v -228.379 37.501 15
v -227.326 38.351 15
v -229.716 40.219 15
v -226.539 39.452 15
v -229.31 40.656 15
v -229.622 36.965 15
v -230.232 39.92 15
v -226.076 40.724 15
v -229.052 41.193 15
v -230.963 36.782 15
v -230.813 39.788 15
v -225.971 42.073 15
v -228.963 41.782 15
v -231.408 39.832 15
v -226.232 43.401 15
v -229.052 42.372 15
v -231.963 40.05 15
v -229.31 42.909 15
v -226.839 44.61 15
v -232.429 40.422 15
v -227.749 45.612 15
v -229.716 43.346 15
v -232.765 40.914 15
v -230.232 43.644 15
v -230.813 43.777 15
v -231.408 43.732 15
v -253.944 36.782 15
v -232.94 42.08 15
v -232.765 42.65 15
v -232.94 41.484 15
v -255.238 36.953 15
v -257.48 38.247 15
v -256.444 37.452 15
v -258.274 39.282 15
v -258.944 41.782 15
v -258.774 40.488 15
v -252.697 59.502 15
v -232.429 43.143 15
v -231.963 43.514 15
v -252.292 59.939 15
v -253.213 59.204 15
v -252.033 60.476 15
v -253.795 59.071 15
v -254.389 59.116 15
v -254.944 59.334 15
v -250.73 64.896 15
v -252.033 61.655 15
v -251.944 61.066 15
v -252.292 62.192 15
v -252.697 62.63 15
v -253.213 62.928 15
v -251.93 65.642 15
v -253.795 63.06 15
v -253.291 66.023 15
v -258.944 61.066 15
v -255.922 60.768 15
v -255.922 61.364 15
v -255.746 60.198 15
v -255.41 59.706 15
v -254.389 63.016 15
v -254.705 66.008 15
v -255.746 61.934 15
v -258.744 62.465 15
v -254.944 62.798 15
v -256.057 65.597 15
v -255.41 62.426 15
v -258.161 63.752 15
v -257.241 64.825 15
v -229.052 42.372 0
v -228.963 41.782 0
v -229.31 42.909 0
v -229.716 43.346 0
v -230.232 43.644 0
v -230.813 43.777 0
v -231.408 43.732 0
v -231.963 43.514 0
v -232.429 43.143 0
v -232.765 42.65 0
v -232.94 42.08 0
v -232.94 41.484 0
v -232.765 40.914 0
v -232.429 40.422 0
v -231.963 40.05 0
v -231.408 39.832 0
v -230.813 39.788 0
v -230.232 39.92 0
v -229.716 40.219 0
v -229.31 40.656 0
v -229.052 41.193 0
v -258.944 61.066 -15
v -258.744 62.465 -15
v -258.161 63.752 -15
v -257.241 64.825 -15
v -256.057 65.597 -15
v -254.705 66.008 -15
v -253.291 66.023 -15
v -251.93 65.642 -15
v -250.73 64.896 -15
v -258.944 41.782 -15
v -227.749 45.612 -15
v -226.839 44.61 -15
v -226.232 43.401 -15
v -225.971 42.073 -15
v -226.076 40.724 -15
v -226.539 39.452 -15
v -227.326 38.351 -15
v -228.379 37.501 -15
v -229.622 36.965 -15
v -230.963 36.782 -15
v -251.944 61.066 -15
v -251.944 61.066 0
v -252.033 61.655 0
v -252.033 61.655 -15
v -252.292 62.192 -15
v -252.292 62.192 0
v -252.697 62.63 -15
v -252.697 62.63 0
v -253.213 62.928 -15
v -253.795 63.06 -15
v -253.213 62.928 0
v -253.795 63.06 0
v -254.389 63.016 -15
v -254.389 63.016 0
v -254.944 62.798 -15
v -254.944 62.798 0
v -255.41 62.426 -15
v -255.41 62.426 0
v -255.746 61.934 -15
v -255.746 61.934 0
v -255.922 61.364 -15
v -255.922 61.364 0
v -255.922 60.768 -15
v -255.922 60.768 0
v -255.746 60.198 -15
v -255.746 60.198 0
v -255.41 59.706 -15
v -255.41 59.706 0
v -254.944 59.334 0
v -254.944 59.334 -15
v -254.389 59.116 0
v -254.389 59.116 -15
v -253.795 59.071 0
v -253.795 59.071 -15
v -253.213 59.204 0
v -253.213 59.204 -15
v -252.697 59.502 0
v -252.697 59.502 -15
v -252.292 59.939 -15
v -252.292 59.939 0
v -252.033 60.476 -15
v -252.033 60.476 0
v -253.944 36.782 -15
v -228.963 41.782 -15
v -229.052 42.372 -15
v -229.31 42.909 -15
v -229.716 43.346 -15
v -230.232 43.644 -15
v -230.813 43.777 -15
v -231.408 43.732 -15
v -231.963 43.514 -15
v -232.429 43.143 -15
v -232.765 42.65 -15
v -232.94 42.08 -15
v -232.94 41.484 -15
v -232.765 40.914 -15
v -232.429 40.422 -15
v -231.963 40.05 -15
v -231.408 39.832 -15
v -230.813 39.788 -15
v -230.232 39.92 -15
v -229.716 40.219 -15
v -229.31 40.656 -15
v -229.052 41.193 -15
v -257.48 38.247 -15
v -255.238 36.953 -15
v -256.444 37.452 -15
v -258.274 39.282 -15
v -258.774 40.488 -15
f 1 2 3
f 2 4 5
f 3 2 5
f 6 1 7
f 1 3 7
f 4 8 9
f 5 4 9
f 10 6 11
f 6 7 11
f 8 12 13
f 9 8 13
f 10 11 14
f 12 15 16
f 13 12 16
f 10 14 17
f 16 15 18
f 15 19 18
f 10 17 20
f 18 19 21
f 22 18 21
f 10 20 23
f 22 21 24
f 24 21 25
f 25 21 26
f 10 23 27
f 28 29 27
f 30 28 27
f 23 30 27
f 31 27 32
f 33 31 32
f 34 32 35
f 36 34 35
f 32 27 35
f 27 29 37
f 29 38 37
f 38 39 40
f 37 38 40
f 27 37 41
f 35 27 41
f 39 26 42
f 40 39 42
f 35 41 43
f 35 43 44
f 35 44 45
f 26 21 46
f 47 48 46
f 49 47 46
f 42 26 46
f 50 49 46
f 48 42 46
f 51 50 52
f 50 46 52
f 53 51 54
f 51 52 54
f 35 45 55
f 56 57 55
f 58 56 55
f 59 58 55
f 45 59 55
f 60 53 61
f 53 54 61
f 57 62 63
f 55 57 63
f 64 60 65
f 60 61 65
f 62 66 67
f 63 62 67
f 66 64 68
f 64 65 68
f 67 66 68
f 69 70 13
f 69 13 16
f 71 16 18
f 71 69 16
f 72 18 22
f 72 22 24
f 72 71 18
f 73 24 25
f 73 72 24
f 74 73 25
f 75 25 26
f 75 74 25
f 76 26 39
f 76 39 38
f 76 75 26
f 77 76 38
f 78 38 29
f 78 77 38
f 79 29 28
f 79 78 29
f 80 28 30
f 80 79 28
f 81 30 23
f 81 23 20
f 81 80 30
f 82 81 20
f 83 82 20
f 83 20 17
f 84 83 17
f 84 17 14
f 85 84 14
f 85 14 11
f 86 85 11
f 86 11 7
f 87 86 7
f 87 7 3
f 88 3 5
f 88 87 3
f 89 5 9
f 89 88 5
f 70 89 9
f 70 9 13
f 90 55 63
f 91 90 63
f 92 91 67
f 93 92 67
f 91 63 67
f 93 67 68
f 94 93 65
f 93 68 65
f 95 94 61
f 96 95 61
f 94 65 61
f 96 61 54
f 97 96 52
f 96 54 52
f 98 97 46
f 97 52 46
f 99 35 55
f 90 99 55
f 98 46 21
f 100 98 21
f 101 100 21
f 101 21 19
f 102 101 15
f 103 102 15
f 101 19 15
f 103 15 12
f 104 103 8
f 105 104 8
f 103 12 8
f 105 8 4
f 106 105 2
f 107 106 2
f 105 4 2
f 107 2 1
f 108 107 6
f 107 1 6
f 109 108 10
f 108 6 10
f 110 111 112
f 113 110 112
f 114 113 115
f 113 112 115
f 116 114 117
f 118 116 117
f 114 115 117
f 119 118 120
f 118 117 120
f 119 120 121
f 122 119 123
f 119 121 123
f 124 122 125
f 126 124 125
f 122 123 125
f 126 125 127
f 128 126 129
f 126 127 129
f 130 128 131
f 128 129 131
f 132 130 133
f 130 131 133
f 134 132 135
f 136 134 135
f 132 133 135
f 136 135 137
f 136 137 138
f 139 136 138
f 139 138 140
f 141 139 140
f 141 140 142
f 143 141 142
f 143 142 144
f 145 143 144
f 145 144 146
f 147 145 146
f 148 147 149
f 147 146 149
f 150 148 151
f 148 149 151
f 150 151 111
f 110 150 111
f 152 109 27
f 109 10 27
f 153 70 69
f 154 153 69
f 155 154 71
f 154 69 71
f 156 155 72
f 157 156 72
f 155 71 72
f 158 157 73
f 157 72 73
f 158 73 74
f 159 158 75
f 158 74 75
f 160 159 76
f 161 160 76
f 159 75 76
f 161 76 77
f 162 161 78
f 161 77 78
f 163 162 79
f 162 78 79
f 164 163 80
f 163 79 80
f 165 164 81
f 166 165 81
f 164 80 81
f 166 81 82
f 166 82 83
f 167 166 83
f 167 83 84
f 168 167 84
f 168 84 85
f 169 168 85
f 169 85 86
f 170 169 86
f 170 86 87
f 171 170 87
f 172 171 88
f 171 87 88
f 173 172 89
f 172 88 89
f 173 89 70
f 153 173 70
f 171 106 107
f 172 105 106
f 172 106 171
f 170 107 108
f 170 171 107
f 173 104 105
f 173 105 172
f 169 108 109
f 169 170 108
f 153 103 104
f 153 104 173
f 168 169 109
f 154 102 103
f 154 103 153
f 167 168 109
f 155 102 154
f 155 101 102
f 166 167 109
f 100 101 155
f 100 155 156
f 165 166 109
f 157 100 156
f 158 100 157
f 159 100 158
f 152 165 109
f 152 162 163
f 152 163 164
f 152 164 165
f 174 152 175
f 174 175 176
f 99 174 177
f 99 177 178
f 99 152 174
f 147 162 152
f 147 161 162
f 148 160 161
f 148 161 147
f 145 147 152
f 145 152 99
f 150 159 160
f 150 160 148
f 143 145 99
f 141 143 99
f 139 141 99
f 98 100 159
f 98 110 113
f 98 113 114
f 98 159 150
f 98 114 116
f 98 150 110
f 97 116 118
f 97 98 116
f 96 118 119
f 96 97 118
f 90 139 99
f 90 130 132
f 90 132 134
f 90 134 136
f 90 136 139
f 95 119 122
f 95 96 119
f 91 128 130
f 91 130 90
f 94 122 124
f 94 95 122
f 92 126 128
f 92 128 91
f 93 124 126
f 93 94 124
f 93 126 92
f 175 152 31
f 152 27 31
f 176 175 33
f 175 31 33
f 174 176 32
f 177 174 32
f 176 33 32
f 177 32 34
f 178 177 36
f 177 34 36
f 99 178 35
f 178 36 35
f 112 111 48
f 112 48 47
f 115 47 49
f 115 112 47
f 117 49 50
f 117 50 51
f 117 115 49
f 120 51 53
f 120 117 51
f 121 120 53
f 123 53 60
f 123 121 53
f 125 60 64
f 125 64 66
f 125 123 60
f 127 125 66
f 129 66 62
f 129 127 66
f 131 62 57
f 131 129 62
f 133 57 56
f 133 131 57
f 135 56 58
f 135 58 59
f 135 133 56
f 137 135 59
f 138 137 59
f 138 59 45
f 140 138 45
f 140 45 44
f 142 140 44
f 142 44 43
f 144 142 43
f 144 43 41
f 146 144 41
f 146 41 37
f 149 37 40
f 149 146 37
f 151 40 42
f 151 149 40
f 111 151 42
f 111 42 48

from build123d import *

# Parameters (mm, degrees)
BOSS_EXTRUDE1_DEPTH      = 15
BOSS_EXTRUDE1_DEPTH_BACK = 15
SKETCH1_R                = 2


with BuildPart() as part:
    # Sketch1 → Boss-Extrude1 (new, two sides: drawn at the far end of the back side and taken through both)
    with BuildSketch(Plane.XY.offset(-BOSS_EXTRUDE1_DEPTH_BACK)):
        with BuildLine():
            Line((-250.73011668, 64.896080811), (-227.748783387, 45.61245252))
            ThreePointArc((-227.748783387, 45.61245252), (-226.264258331, 40.072129588), (-230.962721435, 36.782230305))
            Line((-230.962721435, 36.782230305), (-253.944054729, 36.782230305))
            ThreePointArc((-253.944054729, 36.782230305), (-257.479588635, 38.246696399), (-258.944054729, 41.782230305))
            Line((-258.944054729, 41.782230305), (-258.944054729, 61.065858595))
            ThreePointArc((-258.944054729, 61.065858595), (-256.057146037, 65.597397531), (-250.73011668, 64.896080811))
        make_face()
        with Locations((-253.944054729, 61.065858595)):
            Circle(SKETCH1_R, mode=Mode.SUBTRACT)
        with Locations((-230.962721435, 41.782230305)):
            Circle(SKETCH1_R, mode=Mode.SUBTRACT)
    extrude(amount=BOSS_EXTRUDE1_DEPTH + BOSS_EXTRUDE1_DEPTH_BACK)


solid = part.part
